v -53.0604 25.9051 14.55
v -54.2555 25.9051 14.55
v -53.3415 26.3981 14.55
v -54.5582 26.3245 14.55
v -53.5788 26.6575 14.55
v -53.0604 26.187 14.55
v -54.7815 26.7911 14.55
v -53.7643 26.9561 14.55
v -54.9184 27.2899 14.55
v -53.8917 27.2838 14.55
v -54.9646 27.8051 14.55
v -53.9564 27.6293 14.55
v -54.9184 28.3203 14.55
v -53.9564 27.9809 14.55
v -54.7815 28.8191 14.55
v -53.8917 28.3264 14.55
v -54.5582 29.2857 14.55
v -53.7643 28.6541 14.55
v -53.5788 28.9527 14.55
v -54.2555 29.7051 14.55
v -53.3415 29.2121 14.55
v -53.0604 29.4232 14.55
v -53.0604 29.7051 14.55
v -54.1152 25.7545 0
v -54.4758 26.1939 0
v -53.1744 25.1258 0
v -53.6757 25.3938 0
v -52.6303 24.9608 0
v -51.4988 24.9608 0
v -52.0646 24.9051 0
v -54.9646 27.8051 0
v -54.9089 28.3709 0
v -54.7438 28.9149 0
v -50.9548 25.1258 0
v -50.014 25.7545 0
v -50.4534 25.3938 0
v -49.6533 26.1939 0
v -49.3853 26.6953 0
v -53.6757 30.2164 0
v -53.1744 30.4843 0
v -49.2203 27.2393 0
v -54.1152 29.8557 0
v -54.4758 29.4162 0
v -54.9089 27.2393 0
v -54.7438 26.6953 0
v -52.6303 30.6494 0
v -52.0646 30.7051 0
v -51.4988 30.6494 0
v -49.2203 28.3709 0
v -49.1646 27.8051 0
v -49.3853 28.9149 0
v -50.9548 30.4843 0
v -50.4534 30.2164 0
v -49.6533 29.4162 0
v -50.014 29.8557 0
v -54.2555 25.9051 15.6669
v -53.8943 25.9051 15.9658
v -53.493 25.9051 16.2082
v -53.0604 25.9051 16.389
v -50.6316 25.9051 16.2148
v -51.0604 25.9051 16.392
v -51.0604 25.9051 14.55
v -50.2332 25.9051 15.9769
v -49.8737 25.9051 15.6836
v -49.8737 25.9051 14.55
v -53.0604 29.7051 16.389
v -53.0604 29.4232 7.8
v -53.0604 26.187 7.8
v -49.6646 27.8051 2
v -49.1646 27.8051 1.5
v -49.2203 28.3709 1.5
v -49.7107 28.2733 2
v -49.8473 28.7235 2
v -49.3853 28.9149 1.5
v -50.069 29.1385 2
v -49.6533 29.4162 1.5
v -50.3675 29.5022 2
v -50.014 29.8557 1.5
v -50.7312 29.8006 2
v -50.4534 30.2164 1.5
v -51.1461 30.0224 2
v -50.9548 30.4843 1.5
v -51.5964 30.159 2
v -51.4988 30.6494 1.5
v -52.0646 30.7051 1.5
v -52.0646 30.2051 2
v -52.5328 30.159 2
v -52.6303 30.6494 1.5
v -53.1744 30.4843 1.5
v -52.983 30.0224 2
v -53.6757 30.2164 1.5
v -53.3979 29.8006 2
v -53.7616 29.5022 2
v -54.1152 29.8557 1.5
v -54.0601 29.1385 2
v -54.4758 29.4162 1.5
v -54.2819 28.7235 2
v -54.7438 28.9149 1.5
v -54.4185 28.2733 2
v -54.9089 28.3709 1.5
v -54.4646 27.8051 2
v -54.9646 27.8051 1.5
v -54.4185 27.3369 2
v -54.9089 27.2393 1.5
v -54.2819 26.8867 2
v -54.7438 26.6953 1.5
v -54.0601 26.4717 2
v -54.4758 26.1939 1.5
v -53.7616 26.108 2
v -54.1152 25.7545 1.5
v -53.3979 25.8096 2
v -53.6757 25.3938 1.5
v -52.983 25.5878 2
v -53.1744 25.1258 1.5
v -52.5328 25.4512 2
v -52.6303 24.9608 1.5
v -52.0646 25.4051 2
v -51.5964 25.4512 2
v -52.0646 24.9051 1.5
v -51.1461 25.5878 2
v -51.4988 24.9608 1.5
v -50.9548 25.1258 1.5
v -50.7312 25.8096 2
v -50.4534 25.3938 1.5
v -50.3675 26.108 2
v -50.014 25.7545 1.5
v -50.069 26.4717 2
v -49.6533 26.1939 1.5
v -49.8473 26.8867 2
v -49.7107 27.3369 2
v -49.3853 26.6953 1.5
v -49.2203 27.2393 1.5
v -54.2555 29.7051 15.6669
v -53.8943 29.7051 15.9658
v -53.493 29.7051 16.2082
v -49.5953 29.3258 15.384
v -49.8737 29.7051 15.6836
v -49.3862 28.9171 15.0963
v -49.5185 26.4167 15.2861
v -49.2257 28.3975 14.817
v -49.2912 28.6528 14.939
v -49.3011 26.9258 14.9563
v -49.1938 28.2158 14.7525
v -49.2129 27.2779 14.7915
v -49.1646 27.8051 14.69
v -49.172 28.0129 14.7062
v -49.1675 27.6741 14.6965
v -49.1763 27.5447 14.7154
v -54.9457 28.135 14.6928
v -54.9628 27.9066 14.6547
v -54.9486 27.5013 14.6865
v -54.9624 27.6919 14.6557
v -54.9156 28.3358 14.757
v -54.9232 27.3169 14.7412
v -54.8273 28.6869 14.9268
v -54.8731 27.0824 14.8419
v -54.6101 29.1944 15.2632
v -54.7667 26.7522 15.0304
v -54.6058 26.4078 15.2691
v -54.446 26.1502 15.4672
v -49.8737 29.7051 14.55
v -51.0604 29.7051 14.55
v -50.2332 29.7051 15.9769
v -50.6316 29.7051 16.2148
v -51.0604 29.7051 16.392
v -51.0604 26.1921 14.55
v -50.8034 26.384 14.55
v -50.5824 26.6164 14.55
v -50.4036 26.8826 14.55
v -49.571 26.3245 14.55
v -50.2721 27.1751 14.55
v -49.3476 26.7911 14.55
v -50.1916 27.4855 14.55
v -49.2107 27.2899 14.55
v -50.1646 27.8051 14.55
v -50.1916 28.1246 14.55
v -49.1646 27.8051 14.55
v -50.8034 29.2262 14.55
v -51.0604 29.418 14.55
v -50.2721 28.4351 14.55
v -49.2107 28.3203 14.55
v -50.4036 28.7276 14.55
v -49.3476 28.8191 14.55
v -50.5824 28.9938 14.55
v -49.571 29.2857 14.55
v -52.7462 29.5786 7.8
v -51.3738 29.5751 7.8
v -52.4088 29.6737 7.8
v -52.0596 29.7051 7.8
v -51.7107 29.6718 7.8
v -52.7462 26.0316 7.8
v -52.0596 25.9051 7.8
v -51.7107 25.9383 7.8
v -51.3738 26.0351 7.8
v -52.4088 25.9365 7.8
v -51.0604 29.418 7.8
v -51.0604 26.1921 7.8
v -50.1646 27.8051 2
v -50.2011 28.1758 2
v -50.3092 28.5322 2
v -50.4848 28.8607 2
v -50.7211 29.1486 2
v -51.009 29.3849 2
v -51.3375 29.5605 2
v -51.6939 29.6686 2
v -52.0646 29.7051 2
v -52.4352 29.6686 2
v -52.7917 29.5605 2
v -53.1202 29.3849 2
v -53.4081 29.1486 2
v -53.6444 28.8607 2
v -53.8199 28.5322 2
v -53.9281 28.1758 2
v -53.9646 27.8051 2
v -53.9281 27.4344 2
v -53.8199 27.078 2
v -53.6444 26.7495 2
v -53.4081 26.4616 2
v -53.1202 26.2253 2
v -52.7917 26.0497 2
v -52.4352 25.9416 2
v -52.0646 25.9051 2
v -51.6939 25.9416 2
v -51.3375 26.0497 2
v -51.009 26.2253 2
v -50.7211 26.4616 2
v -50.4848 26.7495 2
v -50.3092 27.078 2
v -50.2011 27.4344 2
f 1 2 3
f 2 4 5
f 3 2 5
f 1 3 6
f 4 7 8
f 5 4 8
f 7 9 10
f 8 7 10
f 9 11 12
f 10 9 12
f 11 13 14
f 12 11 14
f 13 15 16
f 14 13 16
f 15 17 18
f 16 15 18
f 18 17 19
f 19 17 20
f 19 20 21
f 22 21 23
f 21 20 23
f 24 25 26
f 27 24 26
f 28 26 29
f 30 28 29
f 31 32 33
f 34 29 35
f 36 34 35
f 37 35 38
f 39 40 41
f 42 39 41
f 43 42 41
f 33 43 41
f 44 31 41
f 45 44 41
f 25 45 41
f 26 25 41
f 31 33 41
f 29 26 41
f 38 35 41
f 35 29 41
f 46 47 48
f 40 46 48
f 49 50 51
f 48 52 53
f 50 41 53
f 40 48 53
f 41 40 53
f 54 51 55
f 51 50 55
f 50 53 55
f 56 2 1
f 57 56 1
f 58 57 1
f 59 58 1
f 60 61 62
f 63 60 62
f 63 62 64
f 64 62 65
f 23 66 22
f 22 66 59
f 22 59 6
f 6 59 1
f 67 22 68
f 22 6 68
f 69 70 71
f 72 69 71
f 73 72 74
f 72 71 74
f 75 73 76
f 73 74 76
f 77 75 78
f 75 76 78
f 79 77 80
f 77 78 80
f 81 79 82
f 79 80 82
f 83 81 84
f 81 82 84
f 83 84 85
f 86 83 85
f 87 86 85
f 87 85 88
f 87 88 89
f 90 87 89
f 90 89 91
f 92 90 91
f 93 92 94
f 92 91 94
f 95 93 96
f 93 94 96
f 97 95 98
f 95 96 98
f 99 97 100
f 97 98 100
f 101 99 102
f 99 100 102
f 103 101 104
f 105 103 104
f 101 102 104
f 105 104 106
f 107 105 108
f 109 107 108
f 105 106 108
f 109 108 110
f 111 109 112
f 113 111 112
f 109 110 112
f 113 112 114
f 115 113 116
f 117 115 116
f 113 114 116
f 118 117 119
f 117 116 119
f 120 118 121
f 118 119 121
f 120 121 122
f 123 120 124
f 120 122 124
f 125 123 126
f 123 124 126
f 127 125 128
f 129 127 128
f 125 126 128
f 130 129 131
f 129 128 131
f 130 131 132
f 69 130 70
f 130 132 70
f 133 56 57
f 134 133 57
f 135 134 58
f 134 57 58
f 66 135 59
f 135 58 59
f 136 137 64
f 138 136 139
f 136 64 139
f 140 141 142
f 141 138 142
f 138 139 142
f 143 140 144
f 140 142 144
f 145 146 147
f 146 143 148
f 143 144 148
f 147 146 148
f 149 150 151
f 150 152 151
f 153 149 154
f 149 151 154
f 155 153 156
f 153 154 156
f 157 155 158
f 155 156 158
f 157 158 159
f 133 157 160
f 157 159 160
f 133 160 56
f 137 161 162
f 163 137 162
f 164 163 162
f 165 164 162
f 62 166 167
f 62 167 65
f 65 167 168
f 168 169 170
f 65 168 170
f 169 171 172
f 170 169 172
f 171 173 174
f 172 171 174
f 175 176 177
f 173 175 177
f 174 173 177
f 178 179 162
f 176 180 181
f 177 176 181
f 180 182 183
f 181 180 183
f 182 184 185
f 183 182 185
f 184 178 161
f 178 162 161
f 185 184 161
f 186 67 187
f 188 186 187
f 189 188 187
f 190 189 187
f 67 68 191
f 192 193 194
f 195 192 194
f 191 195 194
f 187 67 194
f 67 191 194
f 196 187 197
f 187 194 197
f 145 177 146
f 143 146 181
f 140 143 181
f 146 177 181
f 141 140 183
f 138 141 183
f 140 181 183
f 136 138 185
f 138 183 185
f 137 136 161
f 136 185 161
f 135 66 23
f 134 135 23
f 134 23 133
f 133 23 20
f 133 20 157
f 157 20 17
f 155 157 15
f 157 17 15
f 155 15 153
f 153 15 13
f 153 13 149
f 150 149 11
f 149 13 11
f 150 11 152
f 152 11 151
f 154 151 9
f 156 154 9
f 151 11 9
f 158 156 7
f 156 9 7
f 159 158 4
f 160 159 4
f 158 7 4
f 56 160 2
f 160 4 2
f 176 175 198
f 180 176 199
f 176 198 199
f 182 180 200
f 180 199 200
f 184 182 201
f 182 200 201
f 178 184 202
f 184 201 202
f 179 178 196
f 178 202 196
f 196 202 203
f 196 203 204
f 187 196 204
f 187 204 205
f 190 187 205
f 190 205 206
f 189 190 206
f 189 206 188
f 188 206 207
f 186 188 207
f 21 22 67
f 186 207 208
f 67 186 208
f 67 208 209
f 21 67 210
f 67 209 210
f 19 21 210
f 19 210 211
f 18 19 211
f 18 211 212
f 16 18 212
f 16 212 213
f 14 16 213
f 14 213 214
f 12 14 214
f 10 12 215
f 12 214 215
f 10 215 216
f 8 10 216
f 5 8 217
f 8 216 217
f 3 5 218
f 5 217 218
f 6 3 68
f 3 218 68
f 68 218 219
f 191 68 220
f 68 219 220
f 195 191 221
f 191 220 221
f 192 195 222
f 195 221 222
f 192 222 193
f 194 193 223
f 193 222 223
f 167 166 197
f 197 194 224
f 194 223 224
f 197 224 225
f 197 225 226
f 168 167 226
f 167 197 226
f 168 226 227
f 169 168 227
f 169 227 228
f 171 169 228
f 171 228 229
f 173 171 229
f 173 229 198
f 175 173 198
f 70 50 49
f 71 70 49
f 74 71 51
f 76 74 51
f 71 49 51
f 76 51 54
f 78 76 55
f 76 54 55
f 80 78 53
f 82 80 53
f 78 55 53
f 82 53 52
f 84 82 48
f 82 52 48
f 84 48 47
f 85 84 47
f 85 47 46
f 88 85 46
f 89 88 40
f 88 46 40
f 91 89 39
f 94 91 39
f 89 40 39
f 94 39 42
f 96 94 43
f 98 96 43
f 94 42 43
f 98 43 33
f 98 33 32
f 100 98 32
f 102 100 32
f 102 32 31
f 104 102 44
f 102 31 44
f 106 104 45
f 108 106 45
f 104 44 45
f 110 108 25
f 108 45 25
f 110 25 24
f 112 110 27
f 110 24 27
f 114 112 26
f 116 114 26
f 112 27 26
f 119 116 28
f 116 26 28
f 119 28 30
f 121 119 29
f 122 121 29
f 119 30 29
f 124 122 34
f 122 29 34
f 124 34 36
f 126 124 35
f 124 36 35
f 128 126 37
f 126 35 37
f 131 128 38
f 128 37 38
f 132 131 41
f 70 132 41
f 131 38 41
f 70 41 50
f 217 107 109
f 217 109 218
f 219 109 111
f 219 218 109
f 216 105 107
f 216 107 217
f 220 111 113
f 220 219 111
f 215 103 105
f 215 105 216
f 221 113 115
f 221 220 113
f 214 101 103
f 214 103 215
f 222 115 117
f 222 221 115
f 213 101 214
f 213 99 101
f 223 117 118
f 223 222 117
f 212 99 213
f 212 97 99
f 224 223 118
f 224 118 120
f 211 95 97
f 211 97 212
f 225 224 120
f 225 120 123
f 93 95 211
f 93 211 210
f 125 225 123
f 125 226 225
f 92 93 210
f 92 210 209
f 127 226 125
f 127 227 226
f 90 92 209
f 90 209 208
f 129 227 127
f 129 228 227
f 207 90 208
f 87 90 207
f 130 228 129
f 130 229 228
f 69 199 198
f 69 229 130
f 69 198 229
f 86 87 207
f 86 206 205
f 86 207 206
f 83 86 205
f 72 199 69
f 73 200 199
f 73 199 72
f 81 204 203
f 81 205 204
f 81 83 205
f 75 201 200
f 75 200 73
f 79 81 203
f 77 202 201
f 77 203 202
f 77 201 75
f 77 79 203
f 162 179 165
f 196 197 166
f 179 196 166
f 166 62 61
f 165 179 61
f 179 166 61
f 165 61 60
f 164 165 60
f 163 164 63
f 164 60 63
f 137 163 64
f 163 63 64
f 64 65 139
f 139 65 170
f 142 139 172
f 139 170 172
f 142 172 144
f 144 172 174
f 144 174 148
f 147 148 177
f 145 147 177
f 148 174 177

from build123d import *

# Parameters (mm, degrees)
F0_R     = 2.9
F1_DEPTH = 2
F2_R     = 1.9
F3_DEPTH = 12.55
F5_DEPTH = 2
F7_DEPTH = 25
F8_SIZE  = 0.5
F9_DEPTH = 25


# Not quite as in the source:
# - a feature names something its author has since deleted; it is built from what else it names


with BuildPart() as f1:
    # F0 (on Top) → F1 (new body)
    with BuildSketch(Plane.XY):
        with Locations((-52.0645752549, 27.8050955385)):
            Circle(F0_R)
    extrude(amount=F1_DEPTH)

    # F2 (on face) → F3 (join)
    with BuildSketch(Plane.XY.offset(2)):
        with Locations((-52.0645752549, 27.8050955385)):
            Circle(F2_R)
    extrude(amount=F3_DEPTH)

    # F4 (on face) → F5 (join)
    with BuildSketch(Plane.XY.offset(14.55)):
        with BuildLine():
            Line((-52.0645752549, 29.7050955385), (-54.2554654849, 29.7050955385))
            ThreePointArc((-54.2554654849, 29.7050955385), (-54.9645752549, 27.8050955385), (-54.2554654849, 25.9050955385))
            Line((-54.2554654849, 25.9050955385), (-52.0645752549, 25.9050955385))
            ThreePointArc((-52.0645752549, 25.9050955385), (-53.9645752549, 27.8050955385), (-52.0645752549, 29.7050955385))
        make_face()
        with BuildLine():
            ThreePointArc((-50.1645752549, 27.8050955385), (-50.7210723707, 29.1485984228), (-52.0645752549, 29.7050955385))
            ThreePointArc((-52.0645752549, 29.7050955385), (-53.9645752549, 27.8050955385), (-52.0645752549, 25.9050955385))
            ThreePointArc((-52.0645752549, 25.9050955385), (-50.7210723707, 26.4615926542), (-50.1645752549, 27.8050955385))
        make_face()
        with BuildLine():
            ThreePointArc((-49.8736850249, 25.9050955385), (-49.347630126, 26.7910890462), (-49.1645752549, 27.8050955385))
            ThreePointArc((-49.1645752549, 27.8050955385), (-49.347630126, 28.8191020308), (-49.8736850249, 29.7050955385))
            Line((-49.8736850249, 29.7050955385), (-52.0645752549, 29.7050955385))
            ThreePointArc((-52.0645752549, 29.7050955385), (-50.7210723707, 29.1485984228), (-50.1645752549, 27.8050955385))
            ThreePointArc((-50.1645752549, 27.8050955385), (-50.7210723707, 26.4615926542), (-52.0645752549, 25.9050955385))
            Line((-52.0645752549, 25.9050955385), (-49.8736850249, 25.9050955385))
        make_face()
    extrude(amount=F5_DEPTH)

    # F6 (on face) + F5_face1 (on face) → F7 (cut)
    with BuildSketch(Plane.XZ.offset(-25.9050955385)):
        with BuildLine():
            ThreePointArc((-53.0603808121, 16.3889640887), (-52.6208294658, 16.5013745209), (-52.1697451564, 16.55))
            Line((-52.1697451564, 16.55), (-53.0603808121, 16.55))
            Line((-53.0603808121, 16.55), (-53.0603808121, 16.3889640887))
        make_face()
        with BuildLine():
            Line((-51.0603808121, 16.55), (-51.9418670563, 16.55))
            ThreePointArc((-51.9418670563, 16.55), (-51.4955264095, 16.5022285059), (-51.0603808121, 16.3919996636))
            Line((-51.0603808121, 16.3919996636), (-51.0603808121, 16.55))
        make_face()
        with BuildLine():
            Line((-51.0603808121, 16.55), (-51.0603808121, 16.3919996636))
            ThreePointArc((-51.0603808121, 16.3919996636), (-50.428025883, 16.1031256959), (-49.8736850249, 15.6835698131))
            Line((-49.8736850249, 15.6835698131), (-49.8736850249, 16.55))
            Line((-49.8736850249, 16.55), (-51.0603808121, 16.55))
        make_face()
        with BuildLine():
            Line((-49.1058061063, 16.5520446822), (-52.0558061063, 16.5520446822))
            ThreePointArc((-52.0558061063, 16.5520446822), (-51.9988274089, 16.5515334705), (-51.9418670563, 16.55))
            Line((-51.9418670563, 16.55), (-51.0603808121, 16.55))
            Line((-51.0603808121, 16.55), (-49.8736850249, 16.55))
            Line((-49.8736850249, 16.55), (-49.8736850249, 15.6835698131))
            ThreePointArc((-49.8736850249, 15.6835698131), (-49.4281162504, 15.1596303152), (-49.1058061063, 14.5520446822))
            Line((-49.1058061063, 14.5520446822), (-49.1058061063, 16.5520446822))
        make_face()
        with BuildLine():
            Line((-54.2554654849, 16.55), (-54.2554654849, 15.666854741))
            ThreePointArc((-54.2554654849, 15.666854741), (-53.6981031241, 16.0944069239), (-53.0603808121, 16.3889640887))
            Line((-53.0603808121, 16.3889640887), (-53.0603808121, 16.55))
            Line((-53.0603808121, 16.55), (-54.2554654849, 16.55))
        make_face()
        with BuildLine():
            Line((-52.0558061063, 16.5520446822), (-55.0058061063, 16.5520446822))
            Line((-55.0058061063, 16.5520446822), (-55.0058061063, 14.5520446822))
            ThreePointArc((-55.0058061063, 14.5520446822), (-54.6902791648, 15.1495936288), (-54.2554654849, 15.666854741))
            Line((-54.2554654849, 15.666854741), (-54.2554654849, 16.55))
            Line((-54.2554654849, 16.55), (-53.0603808121, 16.55))
            Line((-53.0603808121, 16.55), (-52.1697451564, 16.55))
            ThreePointArc((-52.1697451564, 16.55), (-52.1127848038, 16.5515334705), (-52.0558061063, 16.5520446822))
        make_face()
        Polygon((-52.0645752549, 14.55), (-53.0603808121, 14.55), (-53.0603808121, 7.8), (-51.0603808121, 7.8), (-51.0603808121, 13.8), (-51.0603808121, 14.55), align=None)
    with BuildSketch(Plane(origin=(-52.0645752549, 29.7050955385, 15.55), x_dir=(-1, 0, 0), z_dir=(0, 1, 0))):
        Polygon((-2.19089023, 1), (-2.19089023, -1), (0, -1), (2.19089023, -1), (2.19089023, 1), align=None)
    extrude(amount=-F7_DEPTH, dir=(0, -1, 0), mode=Mode.SUBTRACT)

    # F8
    f8_edges = [f1.edges().sort_by_distance(p)[0] for p in [
        (-54.964575, 27.805096, 2),
    ]]
    chamfer(f8_edges, length=F8_SIZE)

    # F6 (on face) → F9 (cut)
    with BuildSketch(Plane.XZ.offset(-25.9050955385)):
        with BuildLine():
            ThreePointArc((-51.0603808121, 16.3919996636), (-51.4955264095, 16.5022285059), (-51.9418670563, 16.55))
            Line((-51.9418670563, 16.55), (-52.1697451564, 16.55))
            ThreePointArc((-52.1697451564, 16.55), (-52.6208294658, 16.5013745209), (-53.0603808121, 16.3889640887))
            Line((-53.0603808121, 16.3889640887), (-53.0603808121, 14.5520446822))
            Line((-53.0603808121, 14.5520446822), (-53.0603808121, 14.55))
            Line((-53.0603808121, 14.55), (-52.0645752549, 14.55))
            Line((-52.0645752549, 14.55), (-51.0603808121, 14.55))
            Line((-51.0603808121, 14.55), (-51.0603808121, 14.5520446822))
            Line((-51.0603808121, 14.5520446822), (-51.0603808121, 16.3919996636))
        make_face()
        Polygon((-52.0645752549, 14.55), (-53.0603808121, 14.55), (-53.0603808121, 7.8), (-51.0603808121, 7.8), (-51.0603808121, 13.8), (-51.0603808121, 14.55), align=None)
    extrude(amount=-F9_DEPTH, mode=Mode.SUBTRACT)


solid = f1.part
